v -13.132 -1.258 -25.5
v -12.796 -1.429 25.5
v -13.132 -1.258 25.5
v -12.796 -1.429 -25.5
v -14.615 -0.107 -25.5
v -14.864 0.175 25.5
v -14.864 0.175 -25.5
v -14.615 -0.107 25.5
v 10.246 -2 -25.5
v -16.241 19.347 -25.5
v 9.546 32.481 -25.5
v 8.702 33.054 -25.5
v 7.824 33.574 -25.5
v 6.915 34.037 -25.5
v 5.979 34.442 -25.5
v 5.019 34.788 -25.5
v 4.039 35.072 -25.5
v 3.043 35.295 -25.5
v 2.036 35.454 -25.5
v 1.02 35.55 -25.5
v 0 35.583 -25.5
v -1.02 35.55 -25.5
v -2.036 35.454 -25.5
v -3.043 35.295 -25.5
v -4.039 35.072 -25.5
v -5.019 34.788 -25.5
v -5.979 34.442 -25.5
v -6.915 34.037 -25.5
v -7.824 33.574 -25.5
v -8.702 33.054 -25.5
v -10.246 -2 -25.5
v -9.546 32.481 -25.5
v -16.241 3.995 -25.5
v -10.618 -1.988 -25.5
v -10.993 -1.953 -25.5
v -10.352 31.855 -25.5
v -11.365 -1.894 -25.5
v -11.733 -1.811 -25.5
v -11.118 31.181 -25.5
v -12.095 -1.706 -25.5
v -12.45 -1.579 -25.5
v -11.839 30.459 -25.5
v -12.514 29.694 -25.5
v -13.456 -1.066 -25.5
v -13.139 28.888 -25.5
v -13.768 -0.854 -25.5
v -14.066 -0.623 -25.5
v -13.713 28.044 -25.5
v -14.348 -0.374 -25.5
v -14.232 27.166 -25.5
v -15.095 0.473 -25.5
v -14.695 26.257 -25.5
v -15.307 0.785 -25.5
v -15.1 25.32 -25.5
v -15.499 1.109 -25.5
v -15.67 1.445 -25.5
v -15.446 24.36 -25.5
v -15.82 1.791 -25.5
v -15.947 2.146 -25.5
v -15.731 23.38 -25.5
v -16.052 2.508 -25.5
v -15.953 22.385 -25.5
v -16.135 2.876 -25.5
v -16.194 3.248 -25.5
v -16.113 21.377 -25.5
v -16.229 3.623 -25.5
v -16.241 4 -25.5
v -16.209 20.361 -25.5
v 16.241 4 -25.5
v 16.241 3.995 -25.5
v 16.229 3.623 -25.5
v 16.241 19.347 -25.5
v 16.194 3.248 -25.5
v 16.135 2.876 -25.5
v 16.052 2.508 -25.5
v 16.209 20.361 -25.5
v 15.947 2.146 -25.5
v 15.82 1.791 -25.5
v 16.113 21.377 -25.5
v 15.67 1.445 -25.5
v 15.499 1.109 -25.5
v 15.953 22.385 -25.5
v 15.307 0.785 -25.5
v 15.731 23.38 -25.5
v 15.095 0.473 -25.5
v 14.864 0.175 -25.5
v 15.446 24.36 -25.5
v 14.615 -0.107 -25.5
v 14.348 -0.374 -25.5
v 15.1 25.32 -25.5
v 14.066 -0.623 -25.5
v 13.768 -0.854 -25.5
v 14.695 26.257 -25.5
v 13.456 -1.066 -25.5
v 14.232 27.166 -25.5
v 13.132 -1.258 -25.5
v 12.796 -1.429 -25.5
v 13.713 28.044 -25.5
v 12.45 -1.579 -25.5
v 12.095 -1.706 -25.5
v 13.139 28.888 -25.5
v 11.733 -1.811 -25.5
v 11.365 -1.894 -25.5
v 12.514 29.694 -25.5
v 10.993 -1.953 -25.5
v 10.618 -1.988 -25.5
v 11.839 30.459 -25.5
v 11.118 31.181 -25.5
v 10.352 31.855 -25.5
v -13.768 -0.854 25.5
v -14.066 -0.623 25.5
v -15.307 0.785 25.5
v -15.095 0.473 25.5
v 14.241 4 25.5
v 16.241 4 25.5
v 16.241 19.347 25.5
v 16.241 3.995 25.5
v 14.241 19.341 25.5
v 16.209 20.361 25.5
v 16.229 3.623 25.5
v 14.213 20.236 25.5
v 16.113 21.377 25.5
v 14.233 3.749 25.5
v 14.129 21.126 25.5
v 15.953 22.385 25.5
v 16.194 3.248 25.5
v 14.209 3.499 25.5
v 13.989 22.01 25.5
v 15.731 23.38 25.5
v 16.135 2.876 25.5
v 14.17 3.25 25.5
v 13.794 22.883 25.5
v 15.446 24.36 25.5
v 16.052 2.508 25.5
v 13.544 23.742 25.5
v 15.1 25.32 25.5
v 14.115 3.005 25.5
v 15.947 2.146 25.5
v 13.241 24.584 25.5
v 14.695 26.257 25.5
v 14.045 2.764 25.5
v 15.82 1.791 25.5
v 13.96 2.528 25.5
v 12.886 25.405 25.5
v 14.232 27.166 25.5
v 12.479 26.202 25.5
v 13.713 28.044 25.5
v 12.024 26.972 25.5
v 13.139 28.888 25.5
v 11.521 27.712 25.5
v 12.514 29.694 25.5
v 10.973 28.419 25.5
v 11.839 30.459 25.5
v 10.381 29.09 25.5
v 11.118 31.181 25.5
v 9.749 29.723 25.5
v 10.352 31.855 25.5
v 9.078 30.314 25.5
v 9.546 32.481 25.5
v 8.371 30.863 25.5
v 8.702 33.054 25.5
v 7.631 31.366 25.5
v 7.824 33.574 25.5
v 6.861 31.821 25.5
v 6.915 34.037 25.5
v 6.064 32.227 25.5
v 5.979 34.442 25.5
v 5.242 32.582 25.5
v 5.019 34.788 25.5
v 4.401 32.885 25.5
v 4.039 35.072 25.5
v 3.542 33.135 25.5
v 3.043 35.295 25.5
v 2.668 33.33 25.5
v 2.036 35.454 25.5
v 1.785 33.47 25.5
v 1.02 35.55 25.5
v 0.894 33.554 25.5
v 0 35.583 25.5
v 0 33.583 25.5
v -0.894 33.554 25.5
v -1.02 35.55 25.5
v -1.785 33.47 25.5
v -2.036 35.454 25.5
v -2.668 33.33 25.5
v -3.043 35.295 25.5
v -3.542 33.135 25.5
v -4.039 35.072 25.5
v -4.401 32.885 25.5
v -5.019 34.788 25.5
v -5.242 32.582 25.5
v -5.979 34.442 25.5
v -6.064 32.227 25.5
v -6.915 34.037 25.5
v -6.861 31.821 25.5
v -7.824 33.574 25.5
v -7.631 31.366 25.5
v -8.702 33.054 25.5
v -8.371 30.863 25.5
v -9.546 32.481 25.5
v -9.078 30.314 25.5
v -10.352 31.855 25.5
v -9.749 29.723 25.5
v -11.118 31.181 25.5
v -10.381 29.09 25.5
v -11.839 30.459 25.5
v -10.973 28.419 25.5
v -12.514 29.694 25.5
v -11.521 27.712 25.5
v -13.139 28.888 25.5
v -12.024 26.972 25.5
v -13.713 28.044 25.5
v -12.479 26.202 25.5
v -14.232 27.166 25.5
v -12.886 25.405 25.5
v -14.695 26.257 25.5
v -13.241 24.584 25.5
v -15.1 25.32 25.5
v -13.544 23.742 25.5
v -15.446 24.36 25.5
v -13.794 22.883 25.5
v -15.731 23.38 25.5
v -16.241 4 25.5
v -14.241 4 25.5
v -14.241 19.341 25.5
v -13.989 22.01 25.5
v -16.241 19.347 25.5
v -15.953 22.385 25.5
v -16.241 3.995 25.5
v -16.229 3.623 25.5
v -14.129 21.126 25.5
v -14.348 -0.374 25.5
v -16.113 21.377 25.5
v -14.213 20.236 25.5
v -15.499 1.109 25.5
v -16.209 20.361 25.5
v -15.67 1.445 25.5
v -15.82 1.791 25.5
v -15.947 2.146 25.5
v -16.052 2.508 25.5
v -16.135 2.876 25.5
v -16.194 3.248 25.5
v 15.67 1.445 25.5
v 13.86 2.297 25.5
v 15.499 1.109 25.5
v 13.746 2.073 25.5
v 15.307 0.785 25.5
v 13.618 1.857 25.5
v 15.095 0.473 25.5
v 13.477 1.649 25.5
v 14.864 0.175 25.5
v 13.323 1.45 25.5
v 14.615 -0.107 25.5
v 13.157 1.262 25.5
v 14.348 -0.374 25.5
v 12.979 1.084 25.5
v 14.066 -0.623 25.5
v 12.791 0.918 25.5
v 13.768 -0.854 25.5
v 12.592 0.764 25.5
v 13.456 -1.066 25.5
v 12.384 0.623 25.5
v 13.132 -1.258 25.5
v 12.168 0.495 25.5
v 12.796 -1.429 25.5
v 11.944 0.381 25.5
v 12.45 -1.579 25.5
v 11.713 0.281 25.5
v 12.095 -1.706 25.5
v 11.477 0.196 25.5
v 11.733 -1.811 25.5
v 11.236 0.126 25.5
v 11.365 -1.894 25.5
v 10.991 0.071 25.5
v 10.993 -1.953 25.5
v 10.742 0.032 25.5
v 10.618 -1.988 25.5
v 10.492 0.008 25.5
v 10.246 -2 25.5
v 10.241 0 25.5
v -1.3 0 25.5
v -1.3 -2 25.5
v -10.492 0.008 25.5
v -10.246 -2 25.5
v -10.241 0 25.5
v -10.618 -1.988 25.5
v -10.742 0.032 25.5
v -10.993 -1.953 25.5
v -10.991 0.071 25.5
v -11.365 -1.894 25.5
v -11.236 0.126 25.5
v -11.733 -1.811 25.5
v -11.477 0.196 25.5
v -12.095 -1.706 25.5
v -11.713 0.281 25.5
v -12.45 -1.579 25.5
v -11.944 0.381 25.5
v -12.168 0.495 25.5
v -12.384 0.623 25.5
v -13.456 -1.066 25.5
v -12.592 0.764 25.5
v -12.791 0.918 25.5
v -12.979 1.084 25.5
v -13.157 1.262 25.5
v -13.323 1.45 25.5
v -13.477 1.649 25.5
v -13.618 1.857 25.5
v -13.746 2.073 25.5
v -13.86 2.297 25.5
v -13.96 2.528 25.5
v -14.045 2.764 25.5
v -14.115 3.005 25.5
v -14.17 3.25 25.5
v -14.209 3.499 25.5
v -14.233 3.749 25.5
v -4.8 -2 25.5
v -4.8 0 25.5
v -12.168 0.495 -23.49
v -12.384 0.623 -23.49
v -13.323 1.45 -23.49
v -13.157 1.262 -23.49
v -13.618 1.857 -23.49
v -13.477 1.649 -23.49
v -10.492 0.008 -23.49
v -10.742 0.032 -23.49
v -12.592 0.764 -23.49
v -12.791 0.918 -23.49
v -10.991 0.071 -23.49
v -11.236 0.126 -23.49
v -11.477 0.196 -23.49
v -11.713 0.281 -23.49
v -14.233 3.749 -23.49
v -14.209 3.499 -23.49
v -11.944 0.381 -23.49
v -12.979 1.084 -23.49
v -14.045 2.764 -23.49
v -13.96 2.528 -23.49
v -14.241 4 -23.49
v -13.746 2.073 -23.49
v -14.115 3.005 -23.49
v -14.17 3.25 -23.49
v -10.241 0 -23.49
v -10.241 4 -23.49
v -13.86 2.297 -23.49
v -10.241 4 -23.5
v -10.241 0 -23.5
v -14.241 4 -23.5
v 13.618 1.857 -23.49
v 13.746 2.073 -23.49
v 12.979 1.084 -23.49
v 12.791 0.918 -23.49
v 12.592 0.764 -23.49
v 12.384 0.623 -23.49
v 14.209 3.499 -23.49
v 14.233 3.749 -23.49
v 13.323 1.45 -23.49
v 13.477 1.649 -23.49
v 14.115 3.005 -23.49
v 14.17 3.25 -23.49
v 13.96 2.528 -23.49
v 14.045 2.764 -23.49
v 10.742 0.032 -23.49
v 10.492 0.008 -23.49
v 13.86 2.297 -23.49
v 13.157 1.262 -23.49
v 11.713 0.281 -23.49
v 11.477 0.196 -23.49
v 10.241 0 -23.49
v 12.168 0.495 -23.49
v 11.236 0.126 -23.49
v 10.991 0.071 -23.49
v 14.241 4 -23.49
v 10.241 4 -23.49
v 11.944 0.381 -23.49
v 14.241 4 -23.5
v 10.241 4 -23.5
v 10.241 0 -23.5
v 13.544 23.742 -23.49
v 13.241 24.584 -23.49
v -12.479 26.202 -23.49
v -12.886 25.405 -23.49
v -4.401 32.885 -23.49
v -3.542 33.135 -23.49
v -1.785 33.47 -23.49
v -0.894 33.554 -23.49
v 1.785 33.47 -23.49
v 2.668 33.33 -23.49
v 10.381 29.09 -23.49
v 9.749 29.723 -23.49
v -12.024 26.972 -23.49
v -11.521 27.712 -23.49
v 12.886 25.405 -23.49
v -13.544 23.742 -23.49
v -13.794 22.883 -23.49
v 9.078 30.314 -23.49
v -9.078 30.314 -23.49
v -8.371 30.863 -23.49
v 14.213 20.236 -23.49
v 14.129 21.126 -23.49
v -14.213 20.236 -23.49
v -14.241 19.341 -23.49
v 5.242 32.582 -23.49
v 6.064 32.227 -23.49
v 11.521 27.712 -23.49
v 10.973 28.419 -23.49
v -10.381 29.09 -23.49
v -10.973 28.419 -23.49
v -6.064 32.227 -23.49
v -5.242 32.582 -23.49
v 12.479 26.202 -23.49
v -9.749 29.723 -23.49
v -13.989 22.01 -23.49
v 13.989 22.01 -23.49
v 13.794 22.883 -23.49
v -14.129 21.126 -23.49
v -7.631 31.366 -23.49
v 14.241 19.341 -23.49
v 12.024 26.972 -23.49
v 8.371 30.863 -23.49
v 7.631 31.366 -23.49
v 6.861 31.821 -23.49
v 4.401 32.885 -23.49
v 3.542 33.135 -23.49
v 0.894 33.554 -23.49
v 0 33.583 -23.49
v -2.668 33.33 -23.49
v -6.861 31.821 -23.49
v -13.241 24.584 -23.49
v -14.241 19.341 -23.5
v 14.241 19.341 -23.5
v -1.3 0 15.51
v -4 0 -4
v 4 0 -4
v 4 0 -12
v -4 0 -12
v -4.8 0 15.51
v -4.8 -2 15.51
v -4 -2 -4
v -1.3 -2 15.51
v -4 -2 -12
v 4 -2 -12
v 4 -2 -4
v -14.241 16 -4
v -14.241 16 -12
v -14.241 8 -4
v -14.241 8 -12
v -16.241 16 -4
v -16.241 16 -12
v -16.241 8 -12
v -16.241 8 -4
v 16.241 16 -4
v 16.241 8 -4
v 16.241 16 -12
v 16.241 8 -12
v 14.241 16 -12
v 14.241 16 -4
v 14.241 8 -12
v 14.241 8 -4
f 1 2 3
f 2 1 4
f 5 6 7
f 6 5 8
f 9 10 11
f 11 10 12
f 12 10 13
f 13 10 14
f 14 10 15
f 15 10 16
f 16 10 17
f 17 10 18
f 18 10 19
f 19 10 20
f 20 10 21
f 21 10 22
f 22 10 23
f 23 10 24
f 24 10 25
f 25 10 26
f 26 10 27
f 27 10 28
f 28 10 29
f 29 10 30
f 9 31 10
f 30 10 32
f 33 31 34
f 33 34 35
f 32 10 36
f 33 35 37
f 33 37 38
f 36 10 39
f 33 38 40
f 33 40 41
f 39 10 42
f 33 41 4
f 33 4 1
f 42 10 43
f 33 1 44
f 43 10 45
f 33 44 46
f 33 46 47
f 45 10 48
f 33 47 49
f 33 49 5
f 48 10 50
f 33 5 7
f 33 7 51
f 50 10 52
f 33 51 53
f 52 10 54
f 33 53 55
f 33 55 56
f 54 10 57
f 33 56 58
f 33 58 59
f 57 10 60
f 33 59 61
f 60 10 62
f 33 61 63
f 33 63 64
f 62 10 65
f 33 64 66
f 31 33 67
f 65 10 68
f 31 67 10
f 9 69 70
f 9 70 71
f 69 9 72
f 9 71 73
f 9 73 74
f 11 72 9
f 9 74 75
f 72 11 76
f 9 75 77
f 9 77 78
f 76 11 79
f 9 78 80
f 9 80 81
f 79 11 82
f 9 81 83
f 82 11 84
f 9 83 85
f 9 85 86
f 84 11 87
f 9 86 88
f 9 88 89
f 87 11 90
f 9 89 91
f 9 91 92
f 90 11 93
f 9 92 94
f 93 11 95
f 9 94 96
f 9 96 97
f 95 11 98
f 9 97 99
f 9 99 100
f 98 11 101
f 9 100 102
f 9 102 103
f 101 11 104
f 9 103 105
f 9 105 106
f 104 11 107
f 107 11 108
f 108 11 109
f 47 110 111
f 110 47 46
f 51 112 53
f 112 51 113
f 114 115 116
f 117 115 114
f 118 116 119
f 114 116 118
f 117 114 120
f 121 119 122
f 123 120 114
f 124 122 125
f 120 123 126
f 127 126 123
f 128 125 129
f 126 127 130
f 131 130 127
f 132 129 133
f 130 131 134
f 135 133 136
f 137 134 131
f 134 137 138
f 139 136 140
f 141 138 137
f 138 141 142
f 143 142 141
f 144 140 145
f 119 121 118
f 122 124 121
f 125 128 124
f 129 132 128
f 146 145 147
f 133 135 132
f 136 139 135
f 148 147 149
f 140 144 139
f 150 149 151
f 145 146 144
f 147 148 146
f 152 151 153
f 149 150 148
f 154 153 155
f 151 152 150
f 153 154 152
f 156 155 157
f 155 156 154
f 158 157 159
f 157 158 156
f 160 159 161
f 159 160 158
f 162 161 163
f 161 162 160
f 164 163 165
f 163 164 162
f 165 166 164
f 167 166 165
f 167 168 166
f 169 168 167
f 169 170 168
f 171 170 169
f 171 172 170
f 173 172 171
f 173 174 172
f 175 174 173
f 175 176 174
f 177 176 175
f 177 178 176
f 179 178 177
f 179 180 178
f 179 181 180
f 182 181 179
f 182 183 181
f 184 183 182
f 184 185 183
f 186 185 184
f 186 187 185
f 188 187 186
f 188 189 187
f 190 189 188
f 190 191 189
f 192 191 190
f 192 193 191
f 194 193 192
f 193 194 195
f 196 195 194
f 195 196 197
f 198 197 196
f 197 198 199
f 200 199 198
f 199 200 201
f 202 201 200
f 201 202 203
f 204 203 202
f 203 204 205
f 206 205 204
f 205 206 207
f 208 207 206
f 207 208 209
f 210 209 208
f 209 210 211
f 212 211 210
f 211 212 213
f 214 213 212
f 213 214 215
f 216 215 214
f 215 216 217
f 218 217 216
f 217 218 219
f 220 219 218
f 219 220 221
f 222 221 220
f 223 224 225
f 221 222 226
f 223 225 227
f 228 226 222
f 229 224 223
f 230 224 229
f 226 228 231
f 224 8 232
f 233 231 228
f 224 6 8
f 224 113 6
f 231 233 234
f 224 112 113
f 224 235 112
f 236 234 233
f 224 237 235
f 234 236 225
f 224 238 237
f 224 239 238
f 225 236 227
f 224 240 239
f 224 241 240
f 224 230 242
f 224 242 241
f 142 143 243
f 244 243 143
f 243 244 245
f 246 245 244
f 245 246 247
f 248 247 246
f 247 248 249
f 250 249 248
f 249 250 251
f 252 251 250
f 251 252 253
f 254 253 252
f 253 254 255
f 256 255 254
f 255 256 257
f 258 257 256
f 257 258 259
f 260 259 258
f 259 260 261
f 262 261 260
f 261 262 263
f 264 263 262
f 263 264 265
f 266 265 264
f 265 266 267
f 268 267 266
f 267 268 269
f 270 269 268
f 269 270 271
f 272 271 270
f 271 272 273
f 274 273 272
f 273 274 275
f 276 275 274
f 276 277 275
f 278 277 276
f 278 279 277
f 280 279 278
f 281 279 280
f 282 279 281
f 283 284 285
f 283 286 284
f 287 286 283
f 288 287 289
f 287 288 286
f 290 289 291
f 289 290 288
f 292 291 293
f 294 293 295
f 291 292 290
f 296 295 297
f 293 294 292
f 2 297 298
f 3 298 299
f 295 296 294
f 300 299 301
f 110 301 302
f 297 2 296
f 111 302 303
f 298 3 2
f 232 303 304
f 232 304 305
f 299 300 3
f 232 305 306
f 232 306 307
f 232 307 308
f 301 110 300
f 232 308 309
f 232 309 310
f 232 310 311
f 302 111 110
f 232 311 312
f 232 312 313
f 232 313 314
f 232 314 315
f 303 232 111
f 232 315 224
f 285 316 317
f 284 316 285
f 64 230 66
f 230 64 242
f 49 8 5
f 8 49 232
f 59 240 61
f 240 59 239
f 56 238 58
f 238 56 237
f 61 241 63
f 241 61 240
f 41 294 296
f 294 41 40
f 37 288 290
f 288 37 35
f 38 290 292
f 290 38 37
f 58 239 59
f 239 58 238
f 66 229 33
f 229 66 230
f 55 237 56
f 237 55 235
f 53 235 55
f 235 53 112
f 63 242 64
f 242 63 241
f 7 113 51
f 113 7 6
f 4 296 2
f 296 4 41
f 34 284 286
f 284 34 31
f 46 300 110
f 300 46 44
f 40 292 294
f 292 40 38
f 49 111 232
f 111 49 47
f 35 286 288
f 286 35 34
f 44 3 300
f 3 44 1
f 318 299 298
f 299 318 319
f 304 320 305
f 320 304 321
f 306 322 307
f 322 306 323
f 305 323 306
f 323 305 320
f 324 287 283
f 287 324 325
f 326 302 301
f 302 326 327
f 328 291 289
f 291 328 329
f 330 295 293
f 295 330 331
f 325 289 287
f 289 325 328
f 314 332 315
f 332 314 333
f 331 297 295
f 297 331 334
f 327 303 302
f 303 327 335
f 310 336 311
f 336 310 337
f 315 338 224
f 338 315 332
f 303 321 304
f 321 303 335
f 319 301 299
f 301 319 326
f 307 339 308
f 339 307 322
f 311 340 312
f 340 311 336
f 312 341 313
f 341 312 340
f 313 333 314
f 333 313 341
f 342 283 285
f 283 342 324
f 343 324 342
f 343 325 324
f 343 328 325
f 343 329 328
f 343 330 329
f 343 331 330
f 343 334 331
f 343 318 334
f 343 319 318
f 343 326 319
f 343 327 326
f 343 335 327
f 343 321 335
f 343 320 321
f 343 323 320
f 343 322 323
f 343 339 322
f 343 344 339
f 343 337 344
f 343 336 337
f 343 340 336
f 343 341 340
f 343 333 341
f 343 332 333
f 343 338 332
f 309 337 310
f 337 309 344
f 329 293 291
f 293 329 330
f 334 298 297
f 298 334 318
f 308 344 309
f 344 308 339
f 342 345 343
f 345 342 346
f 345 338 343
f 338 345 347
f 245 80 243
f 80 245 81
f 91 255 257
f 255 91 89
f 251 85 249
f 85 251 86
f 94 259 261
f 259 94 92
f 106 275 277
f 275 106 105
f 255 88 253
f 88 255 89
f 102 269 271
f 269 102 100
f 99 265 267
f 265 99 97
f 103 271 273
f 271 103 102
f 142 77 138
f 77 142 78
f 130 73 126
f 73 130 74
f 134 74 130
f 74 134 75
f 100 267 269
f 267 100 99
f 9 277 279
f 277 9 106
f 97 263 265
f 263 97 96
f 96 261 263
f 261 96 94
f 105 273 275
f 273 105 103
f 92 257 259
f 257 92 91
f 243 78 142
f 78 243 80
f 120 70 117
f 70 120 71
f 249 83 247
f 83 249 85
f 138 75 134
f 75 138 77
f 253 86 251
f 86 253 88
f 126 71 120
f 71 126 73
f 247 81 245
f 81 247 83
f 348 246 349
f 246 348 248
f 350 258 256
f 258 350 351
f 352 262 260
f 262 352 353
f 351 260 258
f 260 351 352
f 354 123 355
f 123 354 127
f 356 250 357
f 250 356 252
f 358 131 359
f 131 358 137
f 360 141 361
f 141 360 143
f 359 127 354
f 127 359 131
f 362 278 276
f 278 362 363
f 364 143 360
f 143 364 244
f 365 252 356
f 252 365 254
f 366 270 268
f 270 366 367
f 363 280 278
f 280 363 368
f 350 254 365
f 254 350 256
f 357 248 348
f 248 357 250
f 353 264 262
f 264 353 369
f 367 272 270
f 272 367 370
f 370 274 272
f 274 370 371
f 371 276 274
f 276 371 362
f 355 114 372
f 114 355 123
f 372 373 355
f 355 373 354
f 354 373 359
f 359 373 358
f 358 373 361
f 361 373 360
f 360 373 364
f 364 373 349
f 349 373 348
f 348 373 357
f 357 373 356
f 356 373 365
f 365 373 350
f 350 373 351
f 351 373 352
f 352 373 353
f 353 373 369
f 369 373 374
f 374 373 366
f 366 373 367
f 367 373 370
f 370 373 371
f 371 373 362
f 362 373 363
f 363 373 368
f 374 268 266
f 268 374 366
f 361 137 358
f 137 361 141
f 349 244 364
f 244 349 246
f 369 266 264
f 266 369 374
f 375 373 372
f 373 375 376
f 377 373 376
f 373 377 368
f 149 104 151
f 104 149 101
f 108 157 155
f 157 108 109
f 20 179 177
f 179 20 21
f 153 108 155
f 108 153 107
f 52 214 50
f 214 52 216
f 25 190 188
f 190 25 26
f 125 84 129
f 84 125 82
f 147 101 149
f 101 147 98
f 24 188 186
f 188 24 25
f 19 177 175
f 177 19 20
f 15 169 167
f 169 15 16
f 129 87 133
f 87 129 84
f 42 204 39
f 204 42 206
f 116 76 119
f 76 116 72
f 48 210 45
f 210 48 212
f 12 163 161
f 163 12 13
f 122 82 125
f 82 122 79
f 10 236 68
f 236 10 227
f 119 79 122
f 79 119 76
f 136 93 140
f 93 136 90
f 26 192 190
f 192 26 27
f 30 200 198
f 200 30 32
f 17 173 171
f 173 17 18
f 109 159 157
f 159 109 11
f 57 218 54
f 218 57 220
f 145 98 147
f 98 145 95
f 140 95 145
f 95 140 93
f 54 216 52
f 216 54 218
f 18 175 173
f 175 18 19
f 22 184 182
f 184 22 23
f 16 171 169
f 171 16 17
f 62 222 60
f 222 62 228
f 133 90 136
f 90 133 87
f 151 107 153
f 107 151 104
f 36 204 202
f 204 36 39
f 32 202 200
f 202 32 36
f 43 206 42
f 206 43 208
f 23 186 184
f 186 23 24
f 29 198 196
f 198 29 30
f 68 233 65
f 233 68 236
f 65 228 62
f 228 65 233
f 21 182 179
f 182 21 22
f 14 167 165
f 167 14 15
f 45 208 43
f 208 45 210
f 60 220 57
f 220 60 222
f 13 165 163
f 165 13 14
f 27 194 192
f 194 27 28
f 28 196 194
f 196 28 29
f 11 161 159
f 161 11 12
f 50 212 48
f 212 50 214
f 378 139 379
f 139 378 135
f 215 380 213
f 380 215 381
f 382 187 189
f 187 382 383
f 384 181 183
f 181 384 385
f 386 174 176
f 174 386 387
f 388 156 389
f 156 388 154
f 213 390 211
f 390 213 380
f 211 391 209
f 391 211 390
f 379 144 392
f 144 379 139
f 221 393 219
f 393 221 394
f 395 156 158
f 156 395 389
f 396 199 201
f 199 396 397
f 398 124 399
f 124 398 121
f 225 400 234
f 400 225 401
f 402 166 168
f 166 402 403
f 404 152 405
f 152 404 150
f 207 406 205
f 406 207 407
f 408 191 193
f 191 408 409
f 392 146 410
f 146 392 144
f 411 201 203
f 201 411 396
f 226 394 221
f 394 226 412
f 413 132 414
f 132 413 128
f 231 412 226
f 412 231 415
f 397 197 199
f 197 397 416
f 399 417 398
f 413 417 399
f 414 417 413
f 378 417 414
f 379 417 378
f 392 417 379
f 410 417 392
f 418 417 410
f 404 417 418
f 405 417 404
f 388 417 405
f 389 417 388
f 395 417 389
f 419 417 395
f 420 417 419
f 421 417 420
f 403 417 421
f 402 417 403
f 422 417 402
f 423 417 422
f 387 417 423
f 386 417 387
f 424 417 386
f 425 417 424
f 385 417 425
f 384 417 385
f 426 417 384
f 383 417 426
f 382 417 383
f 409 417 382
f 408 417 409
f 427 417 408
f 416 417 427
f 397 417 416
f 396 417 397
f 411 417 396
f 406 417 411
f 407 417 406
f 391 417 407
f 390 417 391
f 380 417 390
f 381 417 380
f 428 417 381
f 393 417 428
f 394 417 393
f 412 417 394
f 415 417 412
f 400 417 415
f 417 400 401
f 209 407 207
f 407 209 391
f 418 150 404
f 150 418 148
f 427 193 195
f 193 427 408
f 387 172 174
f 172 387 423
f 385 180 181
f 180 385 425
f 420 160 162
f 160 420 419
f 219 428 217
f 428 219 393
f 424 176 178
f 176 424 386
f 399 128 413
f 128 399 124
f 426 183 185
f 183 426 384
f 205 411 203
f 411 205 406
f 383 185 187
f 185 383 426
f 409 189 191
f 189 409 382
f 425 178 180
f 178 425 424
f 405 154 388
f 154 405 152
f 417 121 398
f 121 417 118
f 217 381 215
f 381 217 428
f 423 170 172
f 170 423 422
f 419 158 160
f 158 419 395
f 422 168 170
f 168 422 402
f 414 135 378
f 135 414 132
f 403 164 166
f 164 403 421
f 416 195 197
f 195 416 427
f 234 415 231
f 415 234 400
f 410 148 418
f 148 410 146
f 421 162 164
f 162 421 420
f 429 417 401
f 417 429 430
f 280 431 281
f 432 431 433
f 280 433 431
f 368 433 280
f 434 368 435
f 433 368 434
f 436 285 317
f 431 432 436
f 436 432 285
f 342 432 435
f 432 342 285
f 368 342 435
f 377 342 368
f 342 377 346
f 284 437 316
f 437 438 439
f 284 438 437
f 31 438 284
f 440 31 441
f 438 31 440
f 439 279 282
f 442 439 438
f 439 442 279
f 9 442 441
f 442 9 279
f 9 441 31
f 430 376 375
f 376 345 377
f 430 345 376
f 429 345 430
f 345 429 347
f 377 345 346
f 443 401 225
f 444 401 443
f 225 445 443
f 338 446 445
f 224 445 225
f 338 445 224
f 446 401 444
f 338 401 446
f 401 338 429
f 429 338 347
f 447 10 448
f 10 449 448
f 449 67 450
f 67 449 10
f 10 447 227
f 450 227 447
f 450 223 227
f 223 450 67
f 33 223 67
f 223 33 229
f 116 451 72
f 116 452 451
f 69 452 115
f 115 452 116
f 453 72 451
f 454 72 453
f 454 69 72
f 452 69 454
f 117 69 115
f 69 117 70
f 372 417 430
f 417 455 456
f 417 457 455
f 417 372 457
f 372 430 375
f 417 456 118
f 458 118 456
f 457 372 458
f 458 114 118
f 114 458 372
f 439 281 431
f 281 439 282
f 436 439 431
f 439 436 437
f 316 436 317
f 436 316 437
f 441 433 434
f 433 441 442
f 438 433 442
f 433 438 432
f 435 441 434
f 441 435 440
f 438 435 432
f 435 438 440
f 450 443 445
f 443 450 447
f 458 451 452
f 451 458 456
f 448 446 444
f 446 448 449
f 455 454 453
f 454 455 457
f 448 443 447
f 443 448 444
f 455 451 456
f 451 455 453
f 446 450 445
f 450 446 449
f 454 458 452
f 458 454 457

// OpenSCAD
Margin = 1.01; //percentage of margin in the opening
fn = 100;
rnd = .01; //small amount to fix rounding errors
Delta = .01;

//other dimensions
RS = 4; //small radius  (inner DIM)
RL = 14.1*Margin; //large end radius (inner DIM)
W = RL*2;//width equals the large circule diamter I.E. 2*R (inner DIM)
L = 33.25*Margin;//length (inner DIM)
H = 49;//height (inner DIM)
THK = 2;//was 1.5 material thickness

//keying on bottom of battery base
KEY_W = 3.5;//width of key 
KEY_H = 10;//height of key
KEY_OS = 1.3;//key offset

//Electrical connection holes
EC = 8; //8x 8 mm is the correct hole size (for access)
EC_OS = 29.5;//offset from base to electrical connections
EC_PM = 12;//offsetfor the + and - electrical connections


difference(){
	body();
	// Remove the key slot in the base
	translate([-KEY_W-KEY_OS,-1.5*THK,Delta+(H+THK)/2-KEY_H])cube([KEY_W,2*THK,KEY_H]);
	//create hole for front electrical connection
	translate([0,0,((H+THK)/2-EC/2)-EC_OS])
	cube([EC, 4*THK, EC], center = true);
	//create hole for the + and - electrical connections
	translate([0,EC_PM,((H+THK)/2-EC/2)-EC_OS])
	cube([2*W, EC, EC], center = true);

}



/////////////////////////////////////////////////////
// create the entire body
/////////////////////////////////////////////////////
module body()
{
		union() 
		{
			//left (from top) small radius
			translate([-((W/2)-RS),RS,0])
			rotate([0,0,90])
			corner();
			//right (from top) small radius
			translate([((W/2)-RS),RS,0])
			rotate([0,0,180])
			corner();
			//the wall between the corners
			translate([0,-THK/2,0])
			cube([W-2*RS+rnd, THK, H+THK], center = true);
			//with the floor
			translate([0,((RS+THK)/2)-THK,-H/2])
			cube([W-2*RS+rnd, RS+THK, THK], center = true);
			//the left wall
			translate([-(W/2+THK/2),RS+((L-RS-RL)/2),0])
			cube([THK, rnd+(L-RS-RL), H+THK], center = true);
			//the right wall
			translate([(W/2+THK/2),RS+((L-RS-RL)/2),0])
			cube([THK, rnd+(L-RS-RL), H+THK], center = true);
			//the floor
			translate([0,RS+((L-RS-RL)/2),-H/2])
			cube([W, rnd+(L-RS-RL), THK], center = true);
			//the end
			translate([0,L-RL,0])
			rotate([0,0,-90])
			end();
		}//end of union
}

/////////////////////////////////////////////////////
//  Create the corner shell including the "Floor"
/////////////////////////////////////////////////////
module corner()
{
	difference ()
	{
		//the outer cylinder is the part we keep
		cylinder(H+THK, RS+THK, RS+THK, $fn=fn, center = true);
		//remove the inner circle to form the shell
		translate([0,0,Delta+THK/2])
		cylinder(H, RS, RS, $fn=fn, center = true);
		//now remove 25% of the circle (one corner)
		translate([-RS,-RS,0])
		cube([2*RS+Delta,2*RS, H+THK+2*Delta], center = true);
		//now remove 50% of the circle (one corner)
		translate([RS,0,0])
		cube([2*RS,4*RS, H+THK+2*Delta], center = true);
	}//end of differnce
}

/////////////////////////////////////////////////////
//  Create the wall shell including the "Floor"
/////////////////////////////////////////////////////
module end()
{
	difference ()
	{
		//the outer cylinder is the part we keep
		cylinder(H+THK, RL+THK, RL+THK, $fn=fn, center = true);
		//remove the inner circle to form the shell
		translate([0,0,Delta+THK/2])
		cylinder(H, RL, RL, $fn=fn, center = true);
		//now remove 50% of the circle (one corner)
		translate([RL,0,0])
		cube([2*RL,4*RL, H+THK+2*Delta], center = true);
	}//end of differnce
}
